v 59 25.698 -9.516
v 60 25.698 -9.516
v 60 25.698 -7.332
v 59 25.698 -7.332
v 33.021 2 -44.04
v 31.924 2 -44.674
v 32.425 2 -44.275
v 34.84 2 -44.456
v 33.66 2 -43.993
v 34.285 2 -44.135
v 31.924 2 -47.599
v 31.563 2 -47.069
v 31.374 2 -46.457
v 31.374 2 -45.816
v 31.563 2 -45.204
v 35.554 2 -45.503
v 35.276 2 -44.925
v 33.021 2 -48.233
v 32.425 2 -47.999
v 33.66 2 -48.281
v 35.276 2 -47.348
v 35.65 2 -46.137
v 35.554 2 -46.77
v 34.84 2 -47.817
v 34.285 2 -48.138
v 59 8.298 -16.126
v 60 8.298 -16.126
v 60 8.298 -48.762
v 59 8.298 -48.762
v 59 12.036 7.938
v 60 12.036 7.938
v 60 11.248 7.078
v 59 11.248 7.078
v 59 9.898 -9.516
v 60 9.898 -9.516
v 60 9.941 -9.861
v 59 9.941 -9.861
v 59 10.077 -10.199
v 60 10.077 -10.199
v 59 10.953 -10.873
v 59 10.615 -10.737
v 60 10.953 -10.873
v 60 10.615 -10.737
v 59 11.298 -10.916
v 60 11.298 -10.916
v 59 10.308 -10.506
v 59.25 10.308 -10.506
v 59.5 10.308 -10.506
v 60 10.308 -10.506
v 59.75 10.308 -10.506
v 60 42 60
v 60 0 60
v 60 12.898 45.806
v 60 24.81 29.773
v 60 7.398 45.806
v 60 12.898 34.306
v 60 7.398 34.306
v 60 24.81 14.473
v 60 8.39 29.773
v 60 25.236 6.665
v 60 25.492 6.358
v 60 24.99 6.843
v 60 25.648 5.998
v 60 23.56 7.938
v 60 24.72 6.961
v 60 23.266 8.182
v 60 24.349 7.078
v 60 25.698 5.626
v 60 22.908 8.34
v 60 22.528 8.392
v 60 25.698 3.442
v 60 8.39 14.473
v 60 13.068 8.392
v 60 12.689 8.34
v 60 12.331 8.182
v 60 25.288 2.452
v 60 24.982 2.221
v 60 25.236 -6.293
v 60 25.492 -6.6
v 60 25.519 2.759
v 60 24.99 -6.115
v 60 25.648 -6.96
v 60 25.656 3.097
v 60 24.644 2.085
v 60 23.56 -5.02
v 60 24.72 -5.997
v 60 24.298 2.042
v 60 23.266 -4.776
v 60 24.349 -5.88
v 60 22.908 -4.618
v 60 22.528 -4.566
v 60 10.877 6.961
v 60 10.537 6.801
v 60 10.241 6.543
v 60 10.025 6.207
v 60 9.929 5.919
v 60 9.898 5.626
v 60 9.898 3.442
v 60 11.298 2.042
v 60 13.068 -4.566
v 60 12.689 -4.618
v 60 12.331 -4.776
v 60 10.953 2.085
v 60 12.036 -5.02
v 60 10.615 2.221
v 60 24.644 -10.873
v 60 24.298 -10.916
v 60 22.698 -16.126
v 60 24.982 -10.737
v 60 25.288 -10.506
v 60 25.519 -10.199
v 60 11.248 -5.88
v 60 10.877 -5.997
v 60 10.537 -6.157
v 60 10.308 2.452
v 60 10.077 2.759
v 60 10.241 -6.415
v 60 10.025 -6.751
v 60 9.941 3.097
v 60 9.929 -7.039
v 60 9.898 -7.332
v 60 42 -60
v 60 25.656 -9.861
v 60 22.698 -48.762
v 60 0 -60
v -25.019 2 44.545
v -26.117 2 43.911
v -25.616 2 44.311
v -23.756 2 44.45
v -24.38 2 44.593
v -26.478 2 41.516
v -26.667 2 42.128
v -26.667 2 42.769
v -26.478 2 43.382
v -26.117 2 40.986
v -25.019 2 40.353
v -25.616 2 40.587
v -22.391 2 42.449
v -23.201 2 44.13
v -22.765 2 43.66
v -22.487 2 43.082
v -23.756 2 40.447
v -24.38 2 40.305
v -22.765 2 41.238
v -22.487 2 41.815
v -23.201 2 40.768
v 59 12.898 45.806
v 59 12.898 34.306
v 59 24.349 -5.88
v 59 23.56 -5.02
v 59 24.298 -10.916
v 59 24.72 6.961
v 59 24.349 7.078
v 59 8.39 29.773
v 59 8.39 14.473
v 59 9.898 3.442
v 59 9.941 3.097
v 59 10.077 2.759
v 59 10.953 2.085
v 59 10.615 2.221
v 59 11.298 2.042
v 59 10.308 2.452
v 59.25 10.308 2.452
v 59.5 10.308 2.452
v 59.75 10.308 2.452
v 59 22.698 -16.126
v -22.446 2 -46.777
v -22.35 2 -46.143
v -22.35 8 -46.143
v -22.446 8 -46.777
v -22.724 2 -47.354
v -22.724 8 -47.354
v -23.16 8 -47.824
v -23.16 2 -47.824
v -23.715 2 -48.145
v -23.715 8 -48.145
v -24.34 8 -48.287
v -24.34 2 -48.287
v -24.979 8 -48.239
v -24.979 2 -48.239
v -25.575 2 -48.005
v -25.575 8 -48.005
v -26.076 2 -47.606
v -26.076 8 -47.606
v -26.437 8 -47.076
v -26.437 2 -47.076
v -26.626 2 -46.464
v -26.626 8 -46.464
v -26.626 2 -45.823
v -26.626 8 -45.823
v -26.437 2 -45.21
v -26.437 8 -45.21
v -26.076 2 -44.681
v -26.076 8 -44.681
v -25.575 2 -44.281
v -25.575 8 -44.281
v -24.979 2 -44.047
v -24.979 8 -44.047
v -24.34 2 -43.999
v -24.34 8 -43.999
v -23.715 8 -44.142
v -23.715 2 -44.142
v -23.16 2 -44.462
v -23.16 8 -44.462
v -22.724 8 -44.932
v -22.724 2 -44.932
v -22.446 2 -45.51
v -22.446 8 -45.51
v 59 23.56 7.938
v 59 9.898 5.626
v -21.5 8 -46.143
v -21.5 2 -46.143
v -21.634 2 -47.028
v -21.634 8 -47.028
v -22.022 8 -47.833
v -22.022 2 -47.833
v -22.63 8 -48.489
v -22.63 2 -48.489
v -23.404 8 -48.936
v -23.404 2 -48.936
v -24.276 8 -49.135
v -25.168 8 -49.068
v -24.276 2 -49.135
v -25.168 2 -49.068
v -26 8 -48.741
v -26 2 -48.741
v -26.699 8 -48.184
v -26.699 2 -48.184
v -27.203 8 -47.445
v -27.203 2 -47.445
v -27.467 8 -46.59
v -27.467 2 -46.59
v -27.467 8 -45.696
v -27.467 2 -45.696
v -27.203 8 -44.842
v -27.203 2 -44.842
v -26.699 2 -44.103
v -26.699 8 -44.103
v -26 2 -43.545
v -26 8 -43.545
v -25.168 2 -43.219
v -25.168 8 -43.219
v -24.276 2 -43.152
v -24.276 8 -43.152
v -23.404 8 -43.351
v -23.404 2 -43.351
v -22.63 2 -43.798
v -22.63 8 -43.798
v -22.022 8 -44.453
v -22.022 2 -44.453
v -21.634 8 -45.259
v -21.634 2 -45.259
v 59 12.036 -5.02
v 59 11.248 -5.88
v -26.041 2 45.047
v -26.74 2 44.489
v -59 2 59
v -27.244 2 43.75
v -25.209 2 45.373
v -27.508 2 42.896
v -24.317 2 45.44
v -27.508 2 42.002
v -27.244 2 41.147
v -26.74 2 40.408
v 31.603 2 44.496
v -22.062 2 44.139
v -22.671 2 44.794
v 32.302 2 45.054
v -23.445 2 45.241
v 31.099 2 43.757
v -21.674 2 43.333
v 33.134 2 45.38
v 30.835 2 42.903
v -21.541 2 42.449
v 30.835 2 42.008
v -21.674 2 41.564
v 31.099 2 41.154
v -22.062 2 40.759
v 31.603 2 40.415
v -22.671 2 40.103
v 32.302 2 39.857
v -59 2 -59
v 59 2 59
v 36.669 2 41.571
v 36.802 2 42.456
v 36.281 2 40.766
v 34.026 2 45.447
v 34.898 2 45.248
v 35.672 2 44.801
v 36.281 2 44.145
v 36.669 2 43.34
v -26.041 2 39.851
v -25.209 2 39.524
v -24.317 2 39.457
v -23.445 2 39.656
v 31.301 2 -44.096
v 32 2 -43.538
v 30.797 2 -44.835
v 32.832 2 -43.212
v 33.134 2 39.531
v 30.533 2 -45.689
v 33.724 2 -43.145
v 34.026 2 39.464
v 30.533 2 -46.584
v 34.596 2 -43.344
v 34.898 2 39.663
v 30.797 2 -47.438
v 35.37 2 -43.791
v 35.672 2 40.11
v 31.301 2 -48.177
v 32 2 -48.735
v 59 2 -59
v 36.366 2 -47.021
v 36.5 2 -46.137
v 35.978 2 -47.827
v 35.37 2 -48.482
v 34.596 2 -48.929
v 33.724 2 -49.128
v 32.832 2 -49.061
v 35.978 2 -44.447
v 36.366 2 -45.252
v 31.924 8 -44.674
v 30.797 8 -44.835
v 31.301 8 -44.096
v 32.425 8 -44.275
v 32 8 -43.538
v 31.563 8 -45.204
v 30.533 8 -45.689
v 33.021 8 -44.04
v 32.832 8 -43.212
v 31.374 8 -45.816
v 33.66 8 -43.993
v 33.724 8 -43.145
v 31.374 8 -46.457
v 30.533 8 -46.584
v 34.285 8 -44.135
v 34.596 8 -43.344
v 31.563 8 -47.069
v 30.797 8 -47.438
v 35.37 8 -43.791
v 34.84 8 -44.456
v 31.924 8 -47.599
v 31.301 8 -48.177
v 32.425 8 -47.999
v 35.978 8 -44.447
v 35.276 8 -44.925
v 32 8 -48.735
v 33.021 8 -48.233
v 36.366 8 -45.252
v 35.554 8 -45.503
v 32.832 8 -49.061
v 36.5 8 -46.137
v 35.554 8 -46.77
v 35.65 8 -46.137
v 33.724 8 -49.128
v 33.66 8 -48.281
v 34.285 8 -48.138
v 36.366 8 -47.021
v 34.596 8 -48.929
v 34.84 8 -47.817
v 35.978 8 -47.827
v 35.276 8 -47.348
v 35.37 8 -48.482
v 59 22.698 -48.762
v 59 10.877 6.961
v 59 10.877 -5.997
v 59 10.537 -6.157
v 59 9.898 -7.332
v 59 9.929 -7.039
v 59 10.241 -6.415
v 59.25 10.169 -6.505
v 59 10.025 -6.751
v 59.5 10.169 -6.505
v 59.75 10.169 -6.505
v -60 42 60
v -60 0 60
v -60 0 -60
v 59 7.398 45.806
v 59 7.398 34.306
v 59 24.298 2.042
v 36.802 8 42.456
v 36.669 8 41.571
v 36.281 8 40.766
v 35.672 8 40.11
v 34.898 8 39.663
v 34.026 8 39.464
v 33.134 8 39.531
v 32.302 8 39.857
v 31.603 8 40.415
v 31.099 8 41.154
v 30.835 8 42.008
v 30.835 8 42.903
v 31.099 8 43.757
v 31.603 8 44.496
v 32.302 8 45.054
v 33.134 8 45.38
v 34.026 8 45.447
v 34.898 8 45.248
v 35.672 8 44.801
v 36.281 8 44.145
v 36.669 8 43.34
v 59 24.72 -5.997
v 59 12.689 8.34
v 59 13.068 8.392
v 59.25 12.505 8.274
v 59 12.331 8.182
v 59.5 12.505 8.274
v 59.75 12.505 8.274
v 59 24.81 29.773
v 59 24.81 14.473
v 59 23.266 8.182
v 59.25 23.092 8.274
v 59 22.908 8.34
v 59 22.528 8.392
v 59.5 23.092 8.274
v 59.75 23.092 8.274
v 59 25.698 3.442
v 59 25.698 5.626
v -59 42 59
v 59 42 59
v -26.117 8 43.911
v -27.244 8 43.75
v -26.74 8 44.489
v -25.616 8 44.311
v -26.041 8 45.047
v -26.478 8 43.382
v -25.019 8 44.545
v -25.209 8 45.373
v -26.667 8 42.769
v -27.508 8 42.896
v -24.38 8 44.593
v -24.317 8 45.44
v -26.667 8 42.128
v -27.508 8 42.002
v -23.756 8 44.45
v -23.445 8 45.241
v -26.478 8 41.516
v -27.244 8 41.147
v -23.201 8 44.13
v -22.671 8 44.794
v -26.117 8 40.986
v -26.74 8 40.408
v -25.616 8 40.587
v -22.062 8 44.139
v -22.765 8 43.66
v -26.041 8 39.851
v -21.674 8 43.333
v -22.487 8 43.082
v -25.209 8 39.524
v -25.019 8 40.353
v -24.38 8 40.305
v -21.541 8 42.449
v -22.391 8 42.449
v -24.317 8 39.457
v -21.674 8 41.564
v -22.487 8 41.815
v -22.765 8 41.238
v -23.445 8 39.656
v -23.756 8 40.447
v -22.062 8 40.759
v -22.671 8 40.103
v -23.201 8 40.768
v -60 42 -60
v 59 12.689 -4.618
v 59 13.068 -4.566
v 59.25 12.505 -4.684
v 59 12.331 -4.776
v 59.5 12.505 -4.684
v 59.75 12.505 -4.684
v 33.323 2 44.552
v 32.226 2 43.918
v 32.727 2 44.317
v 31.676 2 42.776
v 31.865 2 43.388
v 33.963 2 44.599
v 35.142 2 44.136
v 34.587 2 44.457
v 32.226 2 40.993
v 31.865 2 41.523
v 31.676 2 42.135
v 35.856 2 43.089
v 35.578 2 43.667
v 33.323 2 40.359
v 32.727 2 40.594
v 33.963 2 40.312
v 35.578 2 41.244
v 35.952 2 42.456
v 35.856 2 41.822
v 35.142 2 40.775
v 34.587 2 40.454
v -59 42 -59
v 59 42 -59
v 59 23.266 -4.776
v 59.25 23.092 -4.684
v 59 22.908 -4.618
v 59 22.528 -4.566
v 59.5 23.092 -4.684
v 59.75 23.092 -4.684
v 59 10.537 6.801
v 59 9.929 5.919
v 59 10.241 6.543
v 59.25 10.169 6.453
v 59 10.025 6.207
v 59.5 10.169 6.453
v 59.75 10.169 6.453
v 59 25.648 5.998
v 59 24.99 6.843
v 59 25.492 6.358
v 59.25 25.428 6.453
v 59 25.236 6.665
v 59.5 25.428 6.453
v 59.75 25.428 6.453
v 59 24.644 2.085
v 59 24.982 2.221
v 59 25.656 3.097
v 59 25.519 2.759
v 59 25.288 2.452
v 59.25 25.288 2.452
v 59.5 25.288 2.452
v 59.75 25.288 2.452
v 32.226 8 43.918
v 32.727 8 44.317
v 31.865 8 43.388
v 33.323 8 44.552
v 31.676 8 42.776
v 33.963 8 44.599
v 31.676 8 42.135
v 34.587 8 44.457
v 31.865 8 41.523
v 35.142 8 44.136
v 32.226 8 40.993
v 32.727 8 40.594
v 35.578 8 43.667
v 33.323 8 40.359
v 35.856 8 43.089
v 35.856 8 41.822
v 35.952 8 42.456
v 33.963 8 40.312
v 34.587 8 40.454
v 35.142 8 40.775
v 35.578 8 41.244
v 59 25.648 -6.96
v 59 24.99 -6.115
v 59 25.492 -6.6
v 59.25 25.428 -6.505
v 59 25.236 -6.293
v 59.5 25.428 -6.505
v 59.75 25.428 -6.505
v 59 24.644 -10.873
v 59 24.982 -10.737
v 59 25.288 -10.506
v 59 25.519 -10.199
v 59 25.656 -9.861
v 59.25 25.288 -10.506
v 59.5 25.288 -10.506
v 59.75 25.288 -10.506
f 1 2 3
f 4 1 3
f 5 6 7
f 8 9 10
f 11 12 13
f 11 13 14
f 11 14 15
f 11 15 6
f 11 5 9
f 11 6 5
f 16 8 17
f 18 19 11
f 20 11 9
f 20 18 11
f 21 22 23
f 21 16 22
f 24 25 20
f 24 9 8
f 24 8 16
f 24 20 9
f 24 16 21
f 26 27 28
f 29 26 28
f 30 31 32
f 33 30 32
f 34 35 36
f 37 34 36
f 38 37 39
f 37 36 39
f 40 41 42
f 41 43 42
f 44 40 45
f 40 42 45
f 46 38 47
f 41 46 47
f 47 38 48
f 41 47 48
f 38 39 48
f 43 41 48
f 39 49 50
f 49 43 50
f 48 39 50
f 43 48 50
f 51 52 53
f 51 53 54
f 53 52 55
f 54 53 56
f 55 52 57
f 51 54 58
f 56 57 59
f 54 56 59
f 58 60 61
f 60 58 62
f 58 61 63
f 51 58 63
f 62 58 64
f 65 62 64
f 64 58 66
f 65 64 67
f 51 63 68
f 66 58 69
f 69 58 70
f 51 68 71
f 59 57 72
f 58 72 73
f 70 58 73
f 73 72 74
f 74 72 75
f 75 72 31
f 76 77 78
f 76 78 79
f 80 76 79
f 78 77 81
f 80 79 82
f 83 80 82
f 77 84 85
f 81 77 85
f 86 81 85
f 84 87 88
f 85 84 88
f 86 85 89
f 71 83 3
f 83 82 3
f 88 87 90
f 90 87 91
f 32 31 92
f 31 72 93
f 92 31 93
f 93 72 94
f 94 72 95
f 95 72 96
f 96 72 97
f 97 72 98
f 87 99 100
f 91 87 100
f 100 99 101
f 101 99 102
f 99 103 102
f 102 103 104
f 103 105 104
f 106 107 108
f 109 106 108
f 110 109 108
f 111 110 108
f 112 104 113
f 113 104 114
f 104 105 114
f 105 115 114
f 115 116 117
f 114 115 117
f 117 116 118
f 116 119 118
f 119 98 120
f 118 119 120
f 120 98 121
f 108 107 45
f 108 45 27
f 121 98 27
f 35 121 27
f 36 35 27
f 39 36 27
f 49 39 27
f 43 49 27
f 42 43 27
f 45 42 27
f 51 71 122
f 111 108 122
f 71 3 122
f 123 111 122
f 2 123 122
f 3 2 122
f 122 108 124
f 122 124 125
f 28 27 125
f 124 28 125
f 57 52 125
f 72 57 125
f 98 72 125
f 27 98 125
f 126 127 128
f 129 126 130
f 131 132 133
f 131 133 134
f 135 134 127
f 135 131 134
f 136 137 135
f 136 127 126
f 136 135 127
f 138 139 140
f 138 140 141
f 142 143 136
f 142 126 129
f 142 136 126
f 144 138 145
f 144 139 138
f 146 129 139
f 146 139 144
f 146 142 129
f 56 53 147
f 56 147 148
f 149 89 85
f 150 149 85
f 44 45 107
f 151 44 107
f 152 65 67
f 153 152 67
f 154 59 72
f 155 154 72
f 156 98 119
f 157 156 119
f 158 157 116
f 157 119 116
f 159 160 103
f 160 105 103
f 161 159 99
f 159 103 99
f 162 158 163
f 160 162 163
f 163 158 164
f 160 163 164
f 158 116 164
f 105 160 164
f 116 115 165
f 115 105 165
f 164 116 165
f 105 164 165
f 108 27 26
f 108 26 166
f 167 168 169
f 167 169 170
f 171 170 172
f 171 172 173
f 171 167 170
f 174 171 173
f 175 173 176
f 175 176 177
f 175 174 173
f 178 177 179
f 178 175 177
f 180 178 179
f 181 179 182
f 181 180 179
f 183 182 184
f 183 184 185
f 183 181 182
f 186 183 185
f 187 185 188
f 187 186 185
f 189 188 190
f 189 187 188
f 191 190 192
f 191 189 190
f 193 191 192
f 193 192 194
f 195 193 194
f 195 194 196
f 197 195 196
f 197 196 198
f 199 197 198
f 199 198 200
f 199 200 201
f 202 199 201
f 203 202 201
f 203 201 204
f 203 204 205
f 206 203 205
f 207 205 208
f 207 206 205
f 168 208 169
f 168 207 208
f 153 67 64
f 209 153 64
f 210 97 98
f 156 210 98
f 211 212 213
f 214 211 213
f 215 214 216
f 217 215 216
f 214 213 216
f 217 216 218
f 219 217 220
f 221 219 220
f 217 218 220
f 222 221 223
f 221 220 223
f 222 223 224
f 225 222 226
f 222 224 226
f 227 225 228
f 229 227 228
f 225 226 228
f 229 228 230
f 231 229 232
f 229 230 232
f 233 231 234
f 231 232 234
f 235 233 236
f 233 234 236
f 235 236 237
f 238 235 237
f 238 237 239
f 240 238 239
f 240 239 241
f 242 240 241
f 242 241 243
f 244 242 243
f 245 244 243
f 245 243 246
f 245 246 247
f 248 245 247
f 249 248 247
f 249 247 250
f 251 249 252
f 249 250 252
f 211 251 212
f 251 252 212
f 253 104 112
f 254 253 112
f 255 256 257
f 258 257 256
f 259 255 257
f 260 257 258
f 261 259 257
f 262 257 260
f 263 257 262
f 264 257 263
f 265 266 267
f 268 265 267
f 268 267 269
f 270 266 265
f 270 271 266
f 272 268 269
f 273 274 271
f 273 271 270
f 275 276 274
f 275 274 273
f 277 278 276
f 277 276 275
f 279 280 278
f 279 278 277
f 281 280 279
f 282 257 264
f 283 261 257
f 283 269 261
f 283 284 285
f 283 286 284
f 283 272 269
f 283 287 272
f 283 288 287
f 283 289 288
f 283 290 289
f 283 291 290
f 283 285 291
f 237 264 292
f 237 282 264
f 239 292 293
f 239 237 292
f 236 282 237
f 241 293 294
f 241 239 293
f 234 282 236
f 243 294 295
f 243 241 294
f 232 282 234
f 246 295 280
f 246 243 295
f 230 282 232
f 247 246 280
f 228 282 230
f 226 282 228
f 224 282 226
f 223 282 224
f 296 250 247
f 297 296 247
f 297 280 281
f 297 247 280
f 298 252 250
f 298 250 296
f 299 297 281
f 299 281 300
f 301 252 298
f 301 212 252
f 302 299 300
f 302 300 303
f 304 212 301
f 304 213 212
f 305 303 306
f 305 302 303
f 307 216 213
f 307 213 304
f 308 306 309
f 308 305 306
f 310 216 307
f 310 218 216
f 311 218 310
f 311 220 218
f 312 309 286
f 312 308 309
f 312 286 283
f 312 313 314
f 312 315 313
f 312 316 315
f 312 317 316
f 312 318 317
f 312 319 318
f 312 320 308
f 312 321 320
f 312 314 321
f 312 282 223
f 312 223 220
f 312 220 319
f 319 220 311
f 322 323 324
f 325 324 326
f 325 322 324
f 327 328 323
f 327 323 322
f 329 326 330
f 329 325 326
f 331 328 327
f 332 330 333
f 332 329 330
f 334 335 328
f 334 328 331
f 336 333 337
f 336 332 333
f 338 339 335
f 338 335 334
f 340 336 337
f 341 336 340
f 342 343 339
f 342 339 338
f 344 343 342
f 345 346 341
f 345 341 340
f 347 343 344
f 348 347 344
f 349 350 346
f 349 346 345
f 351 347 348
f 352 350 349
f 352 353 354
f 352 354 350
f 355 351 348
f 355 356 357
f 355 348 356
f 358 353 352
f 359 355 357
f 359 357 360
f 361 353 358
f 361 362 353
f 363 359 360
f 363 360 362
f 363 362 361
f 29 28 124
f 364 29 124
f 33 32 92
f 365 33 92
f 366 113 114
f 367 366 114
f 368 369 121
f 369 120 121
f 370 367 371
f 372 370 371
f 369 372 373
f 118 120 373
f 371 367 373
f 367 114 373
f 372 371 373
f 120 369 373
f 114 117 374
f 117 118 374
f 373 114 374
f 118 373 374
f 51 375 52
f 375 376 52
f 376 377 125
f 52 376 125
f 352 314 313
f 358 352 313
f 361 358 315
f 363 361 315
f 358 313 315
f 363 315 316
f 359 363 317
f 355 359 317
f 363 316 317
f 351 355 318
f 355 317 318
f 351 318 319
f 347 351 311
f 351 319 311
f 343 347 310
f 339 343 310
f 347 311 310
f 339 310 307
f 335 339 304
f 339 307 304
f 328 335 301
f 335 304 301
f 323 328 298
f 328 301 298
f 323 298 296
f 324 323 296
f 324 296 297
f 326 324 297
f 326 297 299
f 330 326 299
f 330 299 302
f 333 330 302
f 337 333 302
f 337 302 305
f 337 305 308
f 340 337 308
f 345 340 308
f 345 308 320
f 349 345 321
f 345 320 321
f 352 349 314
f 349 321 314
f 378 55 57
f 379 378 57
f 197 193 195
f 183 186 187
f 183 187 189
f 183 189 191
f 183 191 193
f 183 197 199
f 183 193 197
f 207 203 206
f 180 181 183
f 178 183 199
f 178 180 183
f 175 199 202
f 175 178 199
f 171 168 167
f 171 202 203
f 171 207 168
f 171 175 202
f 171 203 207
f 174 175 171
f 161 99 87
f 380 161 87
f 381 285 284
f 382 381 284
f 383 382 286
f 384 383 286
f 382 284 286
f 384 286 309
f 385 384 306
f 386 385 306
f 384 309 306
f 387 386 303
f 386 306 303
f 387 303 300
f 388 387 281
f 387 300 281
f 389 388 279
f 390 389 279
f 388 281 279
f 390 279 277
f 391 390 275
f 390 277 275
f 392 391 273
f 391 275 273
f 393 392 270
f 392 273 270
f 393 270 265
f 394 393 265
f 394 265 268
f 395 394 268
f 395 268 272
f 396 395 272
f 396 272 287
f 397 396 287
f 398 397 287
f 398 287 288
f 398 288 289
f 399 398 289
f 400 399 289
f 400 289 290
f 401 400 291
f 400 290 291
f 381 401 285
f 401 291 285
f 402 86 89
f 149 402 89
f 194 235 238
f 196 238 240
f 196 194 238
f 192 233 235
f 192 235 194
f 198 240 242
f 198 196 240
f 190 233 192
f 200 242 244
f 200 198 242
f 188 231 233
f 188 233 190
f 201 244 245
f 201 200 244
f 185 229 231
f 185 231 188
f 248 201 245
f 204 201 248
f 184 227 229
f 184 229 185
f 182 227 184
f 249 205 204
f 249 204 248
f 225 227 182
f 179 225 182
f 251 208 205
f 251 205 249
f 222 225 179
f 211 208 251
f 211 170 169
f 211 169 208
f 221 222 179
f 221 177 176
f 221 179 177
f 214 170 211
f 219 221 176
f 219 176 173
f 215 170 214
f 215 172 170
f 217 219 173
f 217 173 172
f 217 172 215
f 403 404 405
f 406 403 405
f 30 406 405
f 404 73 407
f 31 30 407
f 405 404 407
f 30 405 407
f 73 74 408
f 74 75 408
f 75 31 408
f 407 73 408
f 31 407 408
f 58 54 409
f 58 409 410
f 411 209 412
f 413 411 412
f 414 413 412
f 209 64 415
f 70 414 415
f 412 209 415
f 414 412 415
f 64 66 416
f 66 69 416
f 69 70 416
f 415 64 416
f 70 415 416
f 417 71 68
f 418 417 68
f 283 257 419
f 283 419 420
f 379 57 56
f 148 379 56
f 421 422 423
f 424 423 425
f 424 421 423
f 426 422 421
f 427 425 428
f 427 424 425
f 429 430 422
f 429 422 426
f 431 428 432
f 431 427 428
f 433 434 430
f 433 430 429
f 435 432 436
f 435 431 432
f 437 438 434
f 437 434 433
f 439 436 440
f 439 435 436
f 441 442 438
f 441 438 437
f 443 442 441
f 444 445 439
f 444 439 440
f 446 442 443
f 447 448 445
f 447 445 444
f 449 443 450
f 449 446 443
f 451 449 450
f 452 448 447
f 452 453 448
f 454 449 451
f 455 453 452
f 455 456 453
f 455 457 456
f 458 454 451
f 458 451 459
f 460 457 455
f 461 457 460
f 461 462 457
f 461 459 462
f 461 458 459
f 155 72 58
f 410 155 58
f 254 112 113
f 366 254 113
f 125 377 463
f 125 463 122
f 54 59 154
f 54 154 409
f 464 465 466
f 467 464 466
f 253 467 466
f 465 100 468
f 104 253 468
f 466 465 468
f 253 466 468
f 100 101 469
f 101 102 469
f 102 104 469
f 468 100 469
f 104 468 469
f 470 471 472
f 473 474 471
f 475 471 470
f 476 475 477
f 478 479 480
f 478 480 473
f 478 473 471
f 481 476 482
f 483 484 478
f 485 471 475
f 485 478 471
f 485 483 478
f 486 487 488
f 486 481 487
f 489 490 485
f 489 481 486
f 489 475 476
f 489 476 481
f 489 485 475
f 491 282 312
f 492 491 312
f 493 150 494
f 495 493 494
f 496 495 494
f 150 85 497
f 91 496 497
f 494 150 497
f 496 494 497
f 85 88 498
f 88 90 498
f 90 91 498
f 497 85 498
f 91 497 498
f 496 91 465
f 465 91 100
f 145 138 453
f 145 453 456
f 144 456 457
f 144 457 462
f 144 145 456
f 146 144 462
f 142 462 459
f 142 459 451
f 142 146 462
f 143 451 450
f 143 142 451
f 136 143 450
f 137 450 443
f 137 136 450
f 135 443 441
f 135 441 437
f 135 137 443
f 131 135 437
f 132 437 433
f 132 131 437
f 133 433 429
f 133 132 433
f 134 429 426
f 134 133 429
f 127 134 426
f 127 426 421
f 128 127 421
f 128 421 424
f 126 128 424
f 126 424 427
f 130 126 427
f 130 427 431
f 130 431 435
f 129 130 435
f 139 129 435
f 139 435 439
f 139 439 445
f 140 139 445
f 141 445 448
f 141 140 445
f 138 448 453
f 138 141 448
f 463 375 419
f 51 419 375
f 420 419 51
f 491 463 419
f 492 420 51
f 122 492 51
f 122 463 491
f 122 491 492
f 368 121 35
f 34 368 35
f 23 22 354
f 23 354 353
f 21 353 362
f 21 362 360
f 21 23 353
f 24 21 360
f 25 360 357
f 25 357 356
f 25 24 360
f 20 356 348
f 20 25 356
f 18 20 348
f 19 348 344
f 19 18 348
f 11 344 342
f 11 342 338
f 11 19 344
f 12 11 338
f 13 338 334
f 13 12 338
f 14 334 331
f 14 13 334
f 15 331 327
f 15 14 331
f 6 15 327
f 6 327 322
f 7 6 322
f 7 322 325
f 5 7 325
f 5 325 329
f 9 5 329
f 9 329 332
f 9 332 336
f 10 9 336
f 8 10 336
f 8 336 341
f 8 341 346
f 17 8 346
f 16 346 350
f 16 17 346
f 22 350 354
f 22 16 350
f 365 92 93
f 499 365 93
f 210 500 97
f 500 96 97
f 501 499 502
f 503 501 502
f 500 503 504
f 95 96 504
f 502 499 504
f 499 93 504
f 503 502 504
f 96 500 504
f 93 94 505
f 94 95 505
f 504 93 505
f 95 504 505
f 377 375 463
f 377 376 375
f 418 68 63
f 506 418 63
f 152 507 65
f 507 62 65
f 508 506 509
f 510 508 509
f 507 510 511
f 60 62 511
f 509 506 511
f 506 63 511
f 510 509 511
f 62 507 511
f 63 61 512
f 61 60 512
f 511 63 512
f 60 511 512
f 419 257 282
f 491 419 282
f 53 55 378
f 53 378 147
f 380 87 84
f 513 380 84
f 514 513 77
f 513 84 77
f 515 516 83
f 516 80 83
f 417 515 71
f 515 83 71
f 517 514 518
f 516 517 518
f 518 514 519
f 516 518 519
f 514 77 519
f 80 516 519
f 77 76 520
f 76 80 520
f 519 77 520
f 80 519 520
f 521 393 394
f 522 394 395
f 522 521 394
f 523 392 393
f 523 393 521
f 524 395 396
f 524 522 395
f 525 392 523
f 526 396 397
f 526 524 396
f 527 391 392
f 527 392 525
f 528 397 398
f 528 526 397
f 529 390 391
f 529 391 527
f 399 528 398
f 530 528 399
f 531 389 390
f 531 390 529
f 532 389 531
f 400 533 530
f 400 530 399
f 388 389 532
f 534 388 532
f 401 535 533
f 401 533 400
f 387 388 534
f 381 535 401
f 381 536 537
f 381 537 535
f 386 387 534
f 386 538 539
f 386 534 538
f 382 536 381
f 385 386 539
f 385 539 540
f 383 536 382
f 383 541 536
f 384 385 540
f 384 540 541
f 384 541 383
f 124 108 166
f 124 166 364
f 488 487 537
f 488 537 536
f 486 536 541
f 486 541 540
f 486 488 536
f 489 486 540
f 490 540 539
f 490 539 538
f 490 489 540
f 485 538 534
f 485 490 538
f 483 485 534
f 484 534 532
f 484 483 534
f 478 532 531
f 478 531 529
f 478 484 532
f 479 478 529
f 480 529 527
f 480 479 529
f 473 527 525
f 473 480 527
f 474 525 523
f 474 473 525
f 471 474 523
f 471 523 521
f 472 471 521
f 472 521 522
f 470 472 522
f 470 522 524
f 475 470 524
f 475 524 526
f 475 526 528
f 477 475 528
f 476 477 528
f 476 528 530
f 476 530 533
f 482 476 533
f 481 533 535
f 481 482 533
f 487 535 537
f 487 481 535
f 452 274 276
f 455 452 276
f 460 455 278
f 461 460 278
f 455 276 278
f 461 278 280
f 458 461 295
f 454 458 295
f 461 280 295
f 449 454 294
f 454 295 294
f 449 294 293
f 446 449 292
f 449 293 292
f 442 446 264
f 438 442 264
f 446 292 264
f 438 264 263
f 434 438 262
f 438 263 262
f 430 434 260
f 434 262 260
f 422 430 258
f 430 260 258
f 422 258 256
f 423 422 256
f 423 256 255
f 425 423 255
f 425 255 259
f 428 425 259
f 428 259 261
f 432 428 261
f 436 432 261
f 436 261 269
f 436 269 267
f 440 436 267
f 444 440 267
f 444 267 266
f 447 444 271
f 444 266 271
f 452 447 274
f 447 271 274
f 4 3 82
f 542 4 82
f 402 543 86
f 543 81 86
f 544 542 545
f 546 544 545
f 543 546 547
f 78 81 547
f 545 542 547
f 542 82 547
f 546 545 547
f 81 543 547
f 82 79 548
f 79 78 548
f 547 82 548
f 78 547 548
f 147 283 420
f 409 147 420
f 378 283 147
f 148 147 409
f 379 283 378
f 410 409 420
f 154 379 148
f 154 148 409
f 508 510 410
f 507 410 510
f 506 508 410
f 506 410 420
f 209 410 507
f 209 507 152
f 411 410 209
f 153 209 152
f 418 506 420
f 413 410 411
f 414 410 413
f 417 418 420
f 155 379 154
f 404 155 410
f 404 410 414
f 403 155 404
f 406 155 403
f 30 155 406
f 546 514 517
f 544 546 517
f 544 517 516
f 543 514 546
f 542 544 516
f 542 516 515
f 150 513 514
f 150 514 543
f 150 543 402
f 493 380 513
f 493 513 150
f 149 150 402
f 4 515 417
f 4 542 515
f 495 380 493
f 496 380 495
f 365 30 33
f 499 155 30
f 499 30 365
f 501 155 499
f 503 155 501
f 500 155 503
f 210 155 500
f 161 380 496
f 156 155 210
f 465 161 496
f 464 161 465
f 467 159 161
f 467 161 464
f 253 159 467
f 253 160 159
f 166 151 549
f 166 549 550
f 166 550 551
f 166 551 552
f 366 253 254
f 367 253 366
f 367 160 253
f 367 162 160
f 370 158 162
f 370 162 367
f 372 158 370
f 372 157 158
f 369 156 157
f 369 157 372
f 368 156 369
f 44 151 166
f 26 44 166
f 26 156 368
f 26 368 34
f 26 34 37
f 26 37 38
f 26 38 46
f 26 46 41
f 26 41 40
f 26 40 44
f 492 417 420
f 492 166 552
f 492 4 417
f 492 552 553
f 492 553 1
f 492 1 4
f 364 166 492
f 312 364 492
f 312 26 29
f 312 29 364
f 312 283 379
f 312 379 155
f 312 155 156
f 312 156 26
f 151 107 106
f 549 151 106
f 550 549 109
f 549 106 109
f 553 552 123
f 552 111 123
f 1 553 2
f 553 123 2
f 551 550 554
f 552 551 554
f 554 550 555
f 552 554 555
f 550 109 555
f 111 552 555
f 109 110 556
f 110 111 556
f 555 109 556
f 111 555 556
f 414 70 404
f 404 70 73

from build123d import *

# Parameters (mm, degrees)
SKETCH1_W           = 120
SKETCH1_H           = 120
BOSS_EXTRUDE1_DEPTH = 2
SKETCH3_R           = 3
SKETCH3_R_2         = 2.15
BOSS_EXTRUDE2_DEPTH = 6
SKETCH4_W           = 120
SKETCH4_H           = 120
SKETCH4_W_2         = 118
SKETCH4_H_2         = 118
BOSS_EXTRUDE3_DEPTH = 40
SKETCH5_W           = 15.299999553
SKETCH5_H           = 16.42
SKETCH5_W_2         = 32.63620328
SKETCH5_H_2         = 14.399997005
SKETCH5_W_3         = 11.5
SKETCH5_H_3         = 5.5
CUT_EXTRUDE1_DEPTH  = 1


with BuildPart() as part:
    # Sketch1 → Boss-Extrude1 (new body)
    with BuildSketch(Plane(origin=(0, 0, 0), x_dir=(1, 0, 0), z_dir=(0, 1, 0))):
        Rectangle(SKETCH1_W, SKETCH1_H)
    extrude(amount=BOSS_EXTRUDE1_DEPTH)

    # Sketch3 → Boss-Extrude2 (add)
    with BuildSketch(Plane(origin=(0, 2, 0), x_dir=(1, 0, 0), z_dir=(0, 1, 0))):
        with Locations((-24.500233826, 46.14332907)):
            Circle(SKETCH3_R)
        with Locations((-24.500233826, 46.14332907)):
            Circle(SKETCH3_R_2, mode=Mode.SUBTRACT)
        with Locations((33.499766618, 46.136550123)):
            Circle(SKETCH3_R)
        with Locations((33.499766618, 46.136550123)):
            Circle(SKETCH3_R_2, mode=Mode.SUBTRACT)
        with Locations((33.801832122, -42.455500627)):
            Circle(SKETCH3_R)
        with Locations((33.801832122, -42.455500627)):
            Circle(SKETCH3_R_2, mode=Mode.SUBTRACT)
        with Locations((-24.541068319, -42.448681603)):
            Circle(SKETCH3_R)
        with Locations((-24.541068319, -42.448681603)):
            Circle(SKETCH3_R_2, mode=Mode.SUBTRACT)
    extrude(amount=BOSS_EXTRUDE2_DEPTH)

    # Sketch4 → Boss-Extrude3 (add)
    with BuildSketch(Plane(origin=(0, 2, 0), x_dir=(1, 0, 0), z_dir=(0, 1, 0))):
        Rectangle(SKETCH4_W, SKETCH4_H)
        Rectangle(SKETCH4_W_2, SKETCH4_H_2, mode=Mode.SUBTRACT)
    extrude(amount=BOSS_EXTRUDE3_DEPTH)

    # Sketch5 → Cut-Extrude1 (cut)
    with BuildSketch(Plane(origin=(60, 0, 0), x_dir=(0, 0, -1), z_dir=(1, 0, 0))):
        with Locations((-22.123446946, 16.599997028)):
            Rectangle(SKETCH5_W, SKETCH5_H)
        with BuildLine():
            Line((-6.960880715, 24.719998619), (-7.078005207, 24.349104393))
            Line((-7.078005207, 24.349104393), (-7.938323111, 23.560479642))
            add(Edge.make_bspline(
                [(-7.938323111, 23.560479642), (-8.008708428, 23.495959767), (-8.135677464, 23.353602564), (-8.283483399, 23.096453844), (-8.373165531, 22.813736363), (-8.392308628, 22.623946344), (-8.392308628, 22.528463847)],
                knots=[0, 0, 0, 0, 0.25, 0.5, 0.75, 1, 1, 1, 1], degree=3))
            Line((-8.392308628, 22.528463847), (-8.392308628, 13.068365563))
            add(Edge.make_bspline(
                [(-8.392308628, 13.068365563), (-8.392308628, 12.972883067), (-8.373165531, 12.783093048), (-8.283483399, 12.500375567), (-8.135677464, 12.243226847), (-8.008708428, 12.100869643), (-7.938323111, 12.036349768)],
                knots=[0, 0, 0, 0, 0.25, 0.5, 0.75, 1, 1, 1, 1], degree=3))
            Line((-7.938323111, 12.036349768), (-7.078005207, 11.247725017))
            Line((-7.078005207, 11.247725017), (-6.960880715, 10.876830791))
            add(Edge.make_bspline(
                [(-6.960880715, 10.876830791), (-6.917752001, 10.740256529), (-6.792916696, 10.483611985), (-6.46908795, 10.147865428), (-6.051410861, 9.940171767), (-5.769087247, 9.898414705), (-5.625864989, 9.898414705)],
                knots=[0, 0, 0, 0, 0.25, 0.5, 0.75, 1, 1, 1, 1], degree=3))
            Line((-5.625864989, 9.898414705), (-3.442308658, 9.898414705))
            add(Edge.make_bspline(
                [(-3.442308658, 9.898414705), (-3.267434145, 9.898414705), (-2.925471239, 9.958566446), (-2.42155584, 10.277661886), (-2.102460404, 10.781577287), (-2.042308664, 11.123540192), (-2.042308664, 11.298414705)],
                knots=[0, 0, 0, 0, 0.25, 0.5, 0.75, 1, 1, 1, 1], degree=3))
            Line((-2.042308664, 11.298414705), (-2.042308664, 24.298414705))
            add(Edge.make_bspline(
                [(-2.042308664, 24.298414705), (-2.042308664, 24.473289219), (-2.102460404, 24.815252124), (-2.42155584, 25.319167525), (-2.925471239, 25.638262964), (-3.267434145, 25.698414705), (-3.442308658, 25.698414705)],
                knots=[0, 0, 0, 0, 0.25, 0.5, 0.75, 1, 1, 1, 1], degree=3))
            Line((-3.442308658, 25.698414705), (-5.625864989, 25.698414705))
            add(Edge.make_bspline(
                [(-5.625864989, 25.698414705), (-5.769087247, 25.698414705), (-6.051410861, 25.656657644), (-6.46908795, 25.448963983), (-6.792916696, 25.113217425), (-6.917752001, 24.856572882), (-6.960880715, 24.719998619)],
                knots=[0, 0, 0, 0, 0.25, 0.5, 0.75, 1, 1, 1, 1], degree=3))
        make_face()
        with BuildLine():
            Line((5.997249079, 24.719998619), (5.880124588, 24.349104393))
            Line((5.880124588, 24.349104393), (5.019806683, 23.560479642))
            add(Edge.make_bspline(
                [(5.019806683, 23.560479642), (4.949421366, 23.495959767), (4.82245233, 23.353602564), (4.674646395, 23.096453844), (4.584964263, 22.813736363), (4.565821167, 22.623946344), (4.565821167, 22.528463847)],
                knots=[0, 0, 0, 0, 0.25, 0.5, 0.75, 1, 1, 1, 1], degree=3))
            Line((4.565821167, 22.528463847), (4.565821167, 13.068365563))
            add(Edge.make_bspline(
                [(4.565821167, 13.068365563), (4.565821167, 12.972883067), (4.584964263, 12.783093048), (4.674646395, 12.500375567), (4.82245233, 12.243226847), (4.949421366, 12.100869643), (5.019806683, 12.036349768)],
                knots=[0, 0, 0, 0, 0.25, 0.5, 0.75, 1, 1, 1, 1], degree=3))
            Line((5.019806683, 12.036349768), (5.880124588, 11.247725017))
            Line((5.880124588, 11.247725017), (5.997249079, 10.876830791))
            add(Edge.make_bspline(
                [(5.997249079, 10.876830791), (6.040377794, 10.740256529), (6.165213099, 10.483611985), (6.489041844, 10.147865428), (6.906718933, 9.940171767), (7.189042547, 9.898414705), (7.332264805, 9.898414705)],
                knots=[0, 0, 0, 0, 0.25, 0.5, 0.75, 1, 1, 1, 1], degree=3))
            Line((7.332264805, 9.898414705), (9.515821136, 9.898414705))
            add(Edge.make_bspline(
                [(9.515821136, 9.898414705), (9.69069565, 9.898414705), (10.032658555, 9.958566446), (10.536573954, 10.277661886), (10.85566939, 10.781577287), (10.91582113, 11.123540192), (10.91582113, 11.298414705)],
                knots=[0, 0, 0, 0, 0.25, 0.5, 0.75, 1, 1, 1, 1], degree=3))
            Line((10.91582113, 11.298414705), (10.91582113, 24.298414705))
            add(Edge.make_bspline(
                [(10.91582113, 24.298414705), (10.91582113, 24.473289219), (10.85566939, 24.815252124), (10.536573954, 25.319167525), (10.032658555, 25.638262964), (9.69069565, 25.698414705), (9.515821136, 25.698414705)],
                knots=[0, 0, 0, 0, 0.25, 0.5, 0.75, 1, 1, 1, 1], degree=3))
            Line((9.515821136, 25.698414705), (7.332264805, 25.698414705))
            add(Edge.make_bspline(
                [(7.332264805, 25.698414705), (7.189042547, 25.698414705), (6.906718933, 25.656657644), (6.489041844, 25.448963983), (6.165213099, 25.113217425), (6.040377793, 24.856572882), (5.997249079, 24.719998619)],
                knots=[0, 0, 0, 0, 0.25, 0.5, 0.75, 1, 1, 1, 1], degree=3))
        make_face()
        with Locations((32.443720838, 15.498417022)):
            Rectangle(SKETCH5_W_2, SKETCH5_H_2)
        with Locations((-40.056026235, 10.14841852)):
            Rectangle(SKETCH5_W_3, SKETCH5_H_3)
    extrude(amount=-CUT_EXTRUDE1_DEPTH, mode=Mode.SUBTRACT)


solid = part.part
